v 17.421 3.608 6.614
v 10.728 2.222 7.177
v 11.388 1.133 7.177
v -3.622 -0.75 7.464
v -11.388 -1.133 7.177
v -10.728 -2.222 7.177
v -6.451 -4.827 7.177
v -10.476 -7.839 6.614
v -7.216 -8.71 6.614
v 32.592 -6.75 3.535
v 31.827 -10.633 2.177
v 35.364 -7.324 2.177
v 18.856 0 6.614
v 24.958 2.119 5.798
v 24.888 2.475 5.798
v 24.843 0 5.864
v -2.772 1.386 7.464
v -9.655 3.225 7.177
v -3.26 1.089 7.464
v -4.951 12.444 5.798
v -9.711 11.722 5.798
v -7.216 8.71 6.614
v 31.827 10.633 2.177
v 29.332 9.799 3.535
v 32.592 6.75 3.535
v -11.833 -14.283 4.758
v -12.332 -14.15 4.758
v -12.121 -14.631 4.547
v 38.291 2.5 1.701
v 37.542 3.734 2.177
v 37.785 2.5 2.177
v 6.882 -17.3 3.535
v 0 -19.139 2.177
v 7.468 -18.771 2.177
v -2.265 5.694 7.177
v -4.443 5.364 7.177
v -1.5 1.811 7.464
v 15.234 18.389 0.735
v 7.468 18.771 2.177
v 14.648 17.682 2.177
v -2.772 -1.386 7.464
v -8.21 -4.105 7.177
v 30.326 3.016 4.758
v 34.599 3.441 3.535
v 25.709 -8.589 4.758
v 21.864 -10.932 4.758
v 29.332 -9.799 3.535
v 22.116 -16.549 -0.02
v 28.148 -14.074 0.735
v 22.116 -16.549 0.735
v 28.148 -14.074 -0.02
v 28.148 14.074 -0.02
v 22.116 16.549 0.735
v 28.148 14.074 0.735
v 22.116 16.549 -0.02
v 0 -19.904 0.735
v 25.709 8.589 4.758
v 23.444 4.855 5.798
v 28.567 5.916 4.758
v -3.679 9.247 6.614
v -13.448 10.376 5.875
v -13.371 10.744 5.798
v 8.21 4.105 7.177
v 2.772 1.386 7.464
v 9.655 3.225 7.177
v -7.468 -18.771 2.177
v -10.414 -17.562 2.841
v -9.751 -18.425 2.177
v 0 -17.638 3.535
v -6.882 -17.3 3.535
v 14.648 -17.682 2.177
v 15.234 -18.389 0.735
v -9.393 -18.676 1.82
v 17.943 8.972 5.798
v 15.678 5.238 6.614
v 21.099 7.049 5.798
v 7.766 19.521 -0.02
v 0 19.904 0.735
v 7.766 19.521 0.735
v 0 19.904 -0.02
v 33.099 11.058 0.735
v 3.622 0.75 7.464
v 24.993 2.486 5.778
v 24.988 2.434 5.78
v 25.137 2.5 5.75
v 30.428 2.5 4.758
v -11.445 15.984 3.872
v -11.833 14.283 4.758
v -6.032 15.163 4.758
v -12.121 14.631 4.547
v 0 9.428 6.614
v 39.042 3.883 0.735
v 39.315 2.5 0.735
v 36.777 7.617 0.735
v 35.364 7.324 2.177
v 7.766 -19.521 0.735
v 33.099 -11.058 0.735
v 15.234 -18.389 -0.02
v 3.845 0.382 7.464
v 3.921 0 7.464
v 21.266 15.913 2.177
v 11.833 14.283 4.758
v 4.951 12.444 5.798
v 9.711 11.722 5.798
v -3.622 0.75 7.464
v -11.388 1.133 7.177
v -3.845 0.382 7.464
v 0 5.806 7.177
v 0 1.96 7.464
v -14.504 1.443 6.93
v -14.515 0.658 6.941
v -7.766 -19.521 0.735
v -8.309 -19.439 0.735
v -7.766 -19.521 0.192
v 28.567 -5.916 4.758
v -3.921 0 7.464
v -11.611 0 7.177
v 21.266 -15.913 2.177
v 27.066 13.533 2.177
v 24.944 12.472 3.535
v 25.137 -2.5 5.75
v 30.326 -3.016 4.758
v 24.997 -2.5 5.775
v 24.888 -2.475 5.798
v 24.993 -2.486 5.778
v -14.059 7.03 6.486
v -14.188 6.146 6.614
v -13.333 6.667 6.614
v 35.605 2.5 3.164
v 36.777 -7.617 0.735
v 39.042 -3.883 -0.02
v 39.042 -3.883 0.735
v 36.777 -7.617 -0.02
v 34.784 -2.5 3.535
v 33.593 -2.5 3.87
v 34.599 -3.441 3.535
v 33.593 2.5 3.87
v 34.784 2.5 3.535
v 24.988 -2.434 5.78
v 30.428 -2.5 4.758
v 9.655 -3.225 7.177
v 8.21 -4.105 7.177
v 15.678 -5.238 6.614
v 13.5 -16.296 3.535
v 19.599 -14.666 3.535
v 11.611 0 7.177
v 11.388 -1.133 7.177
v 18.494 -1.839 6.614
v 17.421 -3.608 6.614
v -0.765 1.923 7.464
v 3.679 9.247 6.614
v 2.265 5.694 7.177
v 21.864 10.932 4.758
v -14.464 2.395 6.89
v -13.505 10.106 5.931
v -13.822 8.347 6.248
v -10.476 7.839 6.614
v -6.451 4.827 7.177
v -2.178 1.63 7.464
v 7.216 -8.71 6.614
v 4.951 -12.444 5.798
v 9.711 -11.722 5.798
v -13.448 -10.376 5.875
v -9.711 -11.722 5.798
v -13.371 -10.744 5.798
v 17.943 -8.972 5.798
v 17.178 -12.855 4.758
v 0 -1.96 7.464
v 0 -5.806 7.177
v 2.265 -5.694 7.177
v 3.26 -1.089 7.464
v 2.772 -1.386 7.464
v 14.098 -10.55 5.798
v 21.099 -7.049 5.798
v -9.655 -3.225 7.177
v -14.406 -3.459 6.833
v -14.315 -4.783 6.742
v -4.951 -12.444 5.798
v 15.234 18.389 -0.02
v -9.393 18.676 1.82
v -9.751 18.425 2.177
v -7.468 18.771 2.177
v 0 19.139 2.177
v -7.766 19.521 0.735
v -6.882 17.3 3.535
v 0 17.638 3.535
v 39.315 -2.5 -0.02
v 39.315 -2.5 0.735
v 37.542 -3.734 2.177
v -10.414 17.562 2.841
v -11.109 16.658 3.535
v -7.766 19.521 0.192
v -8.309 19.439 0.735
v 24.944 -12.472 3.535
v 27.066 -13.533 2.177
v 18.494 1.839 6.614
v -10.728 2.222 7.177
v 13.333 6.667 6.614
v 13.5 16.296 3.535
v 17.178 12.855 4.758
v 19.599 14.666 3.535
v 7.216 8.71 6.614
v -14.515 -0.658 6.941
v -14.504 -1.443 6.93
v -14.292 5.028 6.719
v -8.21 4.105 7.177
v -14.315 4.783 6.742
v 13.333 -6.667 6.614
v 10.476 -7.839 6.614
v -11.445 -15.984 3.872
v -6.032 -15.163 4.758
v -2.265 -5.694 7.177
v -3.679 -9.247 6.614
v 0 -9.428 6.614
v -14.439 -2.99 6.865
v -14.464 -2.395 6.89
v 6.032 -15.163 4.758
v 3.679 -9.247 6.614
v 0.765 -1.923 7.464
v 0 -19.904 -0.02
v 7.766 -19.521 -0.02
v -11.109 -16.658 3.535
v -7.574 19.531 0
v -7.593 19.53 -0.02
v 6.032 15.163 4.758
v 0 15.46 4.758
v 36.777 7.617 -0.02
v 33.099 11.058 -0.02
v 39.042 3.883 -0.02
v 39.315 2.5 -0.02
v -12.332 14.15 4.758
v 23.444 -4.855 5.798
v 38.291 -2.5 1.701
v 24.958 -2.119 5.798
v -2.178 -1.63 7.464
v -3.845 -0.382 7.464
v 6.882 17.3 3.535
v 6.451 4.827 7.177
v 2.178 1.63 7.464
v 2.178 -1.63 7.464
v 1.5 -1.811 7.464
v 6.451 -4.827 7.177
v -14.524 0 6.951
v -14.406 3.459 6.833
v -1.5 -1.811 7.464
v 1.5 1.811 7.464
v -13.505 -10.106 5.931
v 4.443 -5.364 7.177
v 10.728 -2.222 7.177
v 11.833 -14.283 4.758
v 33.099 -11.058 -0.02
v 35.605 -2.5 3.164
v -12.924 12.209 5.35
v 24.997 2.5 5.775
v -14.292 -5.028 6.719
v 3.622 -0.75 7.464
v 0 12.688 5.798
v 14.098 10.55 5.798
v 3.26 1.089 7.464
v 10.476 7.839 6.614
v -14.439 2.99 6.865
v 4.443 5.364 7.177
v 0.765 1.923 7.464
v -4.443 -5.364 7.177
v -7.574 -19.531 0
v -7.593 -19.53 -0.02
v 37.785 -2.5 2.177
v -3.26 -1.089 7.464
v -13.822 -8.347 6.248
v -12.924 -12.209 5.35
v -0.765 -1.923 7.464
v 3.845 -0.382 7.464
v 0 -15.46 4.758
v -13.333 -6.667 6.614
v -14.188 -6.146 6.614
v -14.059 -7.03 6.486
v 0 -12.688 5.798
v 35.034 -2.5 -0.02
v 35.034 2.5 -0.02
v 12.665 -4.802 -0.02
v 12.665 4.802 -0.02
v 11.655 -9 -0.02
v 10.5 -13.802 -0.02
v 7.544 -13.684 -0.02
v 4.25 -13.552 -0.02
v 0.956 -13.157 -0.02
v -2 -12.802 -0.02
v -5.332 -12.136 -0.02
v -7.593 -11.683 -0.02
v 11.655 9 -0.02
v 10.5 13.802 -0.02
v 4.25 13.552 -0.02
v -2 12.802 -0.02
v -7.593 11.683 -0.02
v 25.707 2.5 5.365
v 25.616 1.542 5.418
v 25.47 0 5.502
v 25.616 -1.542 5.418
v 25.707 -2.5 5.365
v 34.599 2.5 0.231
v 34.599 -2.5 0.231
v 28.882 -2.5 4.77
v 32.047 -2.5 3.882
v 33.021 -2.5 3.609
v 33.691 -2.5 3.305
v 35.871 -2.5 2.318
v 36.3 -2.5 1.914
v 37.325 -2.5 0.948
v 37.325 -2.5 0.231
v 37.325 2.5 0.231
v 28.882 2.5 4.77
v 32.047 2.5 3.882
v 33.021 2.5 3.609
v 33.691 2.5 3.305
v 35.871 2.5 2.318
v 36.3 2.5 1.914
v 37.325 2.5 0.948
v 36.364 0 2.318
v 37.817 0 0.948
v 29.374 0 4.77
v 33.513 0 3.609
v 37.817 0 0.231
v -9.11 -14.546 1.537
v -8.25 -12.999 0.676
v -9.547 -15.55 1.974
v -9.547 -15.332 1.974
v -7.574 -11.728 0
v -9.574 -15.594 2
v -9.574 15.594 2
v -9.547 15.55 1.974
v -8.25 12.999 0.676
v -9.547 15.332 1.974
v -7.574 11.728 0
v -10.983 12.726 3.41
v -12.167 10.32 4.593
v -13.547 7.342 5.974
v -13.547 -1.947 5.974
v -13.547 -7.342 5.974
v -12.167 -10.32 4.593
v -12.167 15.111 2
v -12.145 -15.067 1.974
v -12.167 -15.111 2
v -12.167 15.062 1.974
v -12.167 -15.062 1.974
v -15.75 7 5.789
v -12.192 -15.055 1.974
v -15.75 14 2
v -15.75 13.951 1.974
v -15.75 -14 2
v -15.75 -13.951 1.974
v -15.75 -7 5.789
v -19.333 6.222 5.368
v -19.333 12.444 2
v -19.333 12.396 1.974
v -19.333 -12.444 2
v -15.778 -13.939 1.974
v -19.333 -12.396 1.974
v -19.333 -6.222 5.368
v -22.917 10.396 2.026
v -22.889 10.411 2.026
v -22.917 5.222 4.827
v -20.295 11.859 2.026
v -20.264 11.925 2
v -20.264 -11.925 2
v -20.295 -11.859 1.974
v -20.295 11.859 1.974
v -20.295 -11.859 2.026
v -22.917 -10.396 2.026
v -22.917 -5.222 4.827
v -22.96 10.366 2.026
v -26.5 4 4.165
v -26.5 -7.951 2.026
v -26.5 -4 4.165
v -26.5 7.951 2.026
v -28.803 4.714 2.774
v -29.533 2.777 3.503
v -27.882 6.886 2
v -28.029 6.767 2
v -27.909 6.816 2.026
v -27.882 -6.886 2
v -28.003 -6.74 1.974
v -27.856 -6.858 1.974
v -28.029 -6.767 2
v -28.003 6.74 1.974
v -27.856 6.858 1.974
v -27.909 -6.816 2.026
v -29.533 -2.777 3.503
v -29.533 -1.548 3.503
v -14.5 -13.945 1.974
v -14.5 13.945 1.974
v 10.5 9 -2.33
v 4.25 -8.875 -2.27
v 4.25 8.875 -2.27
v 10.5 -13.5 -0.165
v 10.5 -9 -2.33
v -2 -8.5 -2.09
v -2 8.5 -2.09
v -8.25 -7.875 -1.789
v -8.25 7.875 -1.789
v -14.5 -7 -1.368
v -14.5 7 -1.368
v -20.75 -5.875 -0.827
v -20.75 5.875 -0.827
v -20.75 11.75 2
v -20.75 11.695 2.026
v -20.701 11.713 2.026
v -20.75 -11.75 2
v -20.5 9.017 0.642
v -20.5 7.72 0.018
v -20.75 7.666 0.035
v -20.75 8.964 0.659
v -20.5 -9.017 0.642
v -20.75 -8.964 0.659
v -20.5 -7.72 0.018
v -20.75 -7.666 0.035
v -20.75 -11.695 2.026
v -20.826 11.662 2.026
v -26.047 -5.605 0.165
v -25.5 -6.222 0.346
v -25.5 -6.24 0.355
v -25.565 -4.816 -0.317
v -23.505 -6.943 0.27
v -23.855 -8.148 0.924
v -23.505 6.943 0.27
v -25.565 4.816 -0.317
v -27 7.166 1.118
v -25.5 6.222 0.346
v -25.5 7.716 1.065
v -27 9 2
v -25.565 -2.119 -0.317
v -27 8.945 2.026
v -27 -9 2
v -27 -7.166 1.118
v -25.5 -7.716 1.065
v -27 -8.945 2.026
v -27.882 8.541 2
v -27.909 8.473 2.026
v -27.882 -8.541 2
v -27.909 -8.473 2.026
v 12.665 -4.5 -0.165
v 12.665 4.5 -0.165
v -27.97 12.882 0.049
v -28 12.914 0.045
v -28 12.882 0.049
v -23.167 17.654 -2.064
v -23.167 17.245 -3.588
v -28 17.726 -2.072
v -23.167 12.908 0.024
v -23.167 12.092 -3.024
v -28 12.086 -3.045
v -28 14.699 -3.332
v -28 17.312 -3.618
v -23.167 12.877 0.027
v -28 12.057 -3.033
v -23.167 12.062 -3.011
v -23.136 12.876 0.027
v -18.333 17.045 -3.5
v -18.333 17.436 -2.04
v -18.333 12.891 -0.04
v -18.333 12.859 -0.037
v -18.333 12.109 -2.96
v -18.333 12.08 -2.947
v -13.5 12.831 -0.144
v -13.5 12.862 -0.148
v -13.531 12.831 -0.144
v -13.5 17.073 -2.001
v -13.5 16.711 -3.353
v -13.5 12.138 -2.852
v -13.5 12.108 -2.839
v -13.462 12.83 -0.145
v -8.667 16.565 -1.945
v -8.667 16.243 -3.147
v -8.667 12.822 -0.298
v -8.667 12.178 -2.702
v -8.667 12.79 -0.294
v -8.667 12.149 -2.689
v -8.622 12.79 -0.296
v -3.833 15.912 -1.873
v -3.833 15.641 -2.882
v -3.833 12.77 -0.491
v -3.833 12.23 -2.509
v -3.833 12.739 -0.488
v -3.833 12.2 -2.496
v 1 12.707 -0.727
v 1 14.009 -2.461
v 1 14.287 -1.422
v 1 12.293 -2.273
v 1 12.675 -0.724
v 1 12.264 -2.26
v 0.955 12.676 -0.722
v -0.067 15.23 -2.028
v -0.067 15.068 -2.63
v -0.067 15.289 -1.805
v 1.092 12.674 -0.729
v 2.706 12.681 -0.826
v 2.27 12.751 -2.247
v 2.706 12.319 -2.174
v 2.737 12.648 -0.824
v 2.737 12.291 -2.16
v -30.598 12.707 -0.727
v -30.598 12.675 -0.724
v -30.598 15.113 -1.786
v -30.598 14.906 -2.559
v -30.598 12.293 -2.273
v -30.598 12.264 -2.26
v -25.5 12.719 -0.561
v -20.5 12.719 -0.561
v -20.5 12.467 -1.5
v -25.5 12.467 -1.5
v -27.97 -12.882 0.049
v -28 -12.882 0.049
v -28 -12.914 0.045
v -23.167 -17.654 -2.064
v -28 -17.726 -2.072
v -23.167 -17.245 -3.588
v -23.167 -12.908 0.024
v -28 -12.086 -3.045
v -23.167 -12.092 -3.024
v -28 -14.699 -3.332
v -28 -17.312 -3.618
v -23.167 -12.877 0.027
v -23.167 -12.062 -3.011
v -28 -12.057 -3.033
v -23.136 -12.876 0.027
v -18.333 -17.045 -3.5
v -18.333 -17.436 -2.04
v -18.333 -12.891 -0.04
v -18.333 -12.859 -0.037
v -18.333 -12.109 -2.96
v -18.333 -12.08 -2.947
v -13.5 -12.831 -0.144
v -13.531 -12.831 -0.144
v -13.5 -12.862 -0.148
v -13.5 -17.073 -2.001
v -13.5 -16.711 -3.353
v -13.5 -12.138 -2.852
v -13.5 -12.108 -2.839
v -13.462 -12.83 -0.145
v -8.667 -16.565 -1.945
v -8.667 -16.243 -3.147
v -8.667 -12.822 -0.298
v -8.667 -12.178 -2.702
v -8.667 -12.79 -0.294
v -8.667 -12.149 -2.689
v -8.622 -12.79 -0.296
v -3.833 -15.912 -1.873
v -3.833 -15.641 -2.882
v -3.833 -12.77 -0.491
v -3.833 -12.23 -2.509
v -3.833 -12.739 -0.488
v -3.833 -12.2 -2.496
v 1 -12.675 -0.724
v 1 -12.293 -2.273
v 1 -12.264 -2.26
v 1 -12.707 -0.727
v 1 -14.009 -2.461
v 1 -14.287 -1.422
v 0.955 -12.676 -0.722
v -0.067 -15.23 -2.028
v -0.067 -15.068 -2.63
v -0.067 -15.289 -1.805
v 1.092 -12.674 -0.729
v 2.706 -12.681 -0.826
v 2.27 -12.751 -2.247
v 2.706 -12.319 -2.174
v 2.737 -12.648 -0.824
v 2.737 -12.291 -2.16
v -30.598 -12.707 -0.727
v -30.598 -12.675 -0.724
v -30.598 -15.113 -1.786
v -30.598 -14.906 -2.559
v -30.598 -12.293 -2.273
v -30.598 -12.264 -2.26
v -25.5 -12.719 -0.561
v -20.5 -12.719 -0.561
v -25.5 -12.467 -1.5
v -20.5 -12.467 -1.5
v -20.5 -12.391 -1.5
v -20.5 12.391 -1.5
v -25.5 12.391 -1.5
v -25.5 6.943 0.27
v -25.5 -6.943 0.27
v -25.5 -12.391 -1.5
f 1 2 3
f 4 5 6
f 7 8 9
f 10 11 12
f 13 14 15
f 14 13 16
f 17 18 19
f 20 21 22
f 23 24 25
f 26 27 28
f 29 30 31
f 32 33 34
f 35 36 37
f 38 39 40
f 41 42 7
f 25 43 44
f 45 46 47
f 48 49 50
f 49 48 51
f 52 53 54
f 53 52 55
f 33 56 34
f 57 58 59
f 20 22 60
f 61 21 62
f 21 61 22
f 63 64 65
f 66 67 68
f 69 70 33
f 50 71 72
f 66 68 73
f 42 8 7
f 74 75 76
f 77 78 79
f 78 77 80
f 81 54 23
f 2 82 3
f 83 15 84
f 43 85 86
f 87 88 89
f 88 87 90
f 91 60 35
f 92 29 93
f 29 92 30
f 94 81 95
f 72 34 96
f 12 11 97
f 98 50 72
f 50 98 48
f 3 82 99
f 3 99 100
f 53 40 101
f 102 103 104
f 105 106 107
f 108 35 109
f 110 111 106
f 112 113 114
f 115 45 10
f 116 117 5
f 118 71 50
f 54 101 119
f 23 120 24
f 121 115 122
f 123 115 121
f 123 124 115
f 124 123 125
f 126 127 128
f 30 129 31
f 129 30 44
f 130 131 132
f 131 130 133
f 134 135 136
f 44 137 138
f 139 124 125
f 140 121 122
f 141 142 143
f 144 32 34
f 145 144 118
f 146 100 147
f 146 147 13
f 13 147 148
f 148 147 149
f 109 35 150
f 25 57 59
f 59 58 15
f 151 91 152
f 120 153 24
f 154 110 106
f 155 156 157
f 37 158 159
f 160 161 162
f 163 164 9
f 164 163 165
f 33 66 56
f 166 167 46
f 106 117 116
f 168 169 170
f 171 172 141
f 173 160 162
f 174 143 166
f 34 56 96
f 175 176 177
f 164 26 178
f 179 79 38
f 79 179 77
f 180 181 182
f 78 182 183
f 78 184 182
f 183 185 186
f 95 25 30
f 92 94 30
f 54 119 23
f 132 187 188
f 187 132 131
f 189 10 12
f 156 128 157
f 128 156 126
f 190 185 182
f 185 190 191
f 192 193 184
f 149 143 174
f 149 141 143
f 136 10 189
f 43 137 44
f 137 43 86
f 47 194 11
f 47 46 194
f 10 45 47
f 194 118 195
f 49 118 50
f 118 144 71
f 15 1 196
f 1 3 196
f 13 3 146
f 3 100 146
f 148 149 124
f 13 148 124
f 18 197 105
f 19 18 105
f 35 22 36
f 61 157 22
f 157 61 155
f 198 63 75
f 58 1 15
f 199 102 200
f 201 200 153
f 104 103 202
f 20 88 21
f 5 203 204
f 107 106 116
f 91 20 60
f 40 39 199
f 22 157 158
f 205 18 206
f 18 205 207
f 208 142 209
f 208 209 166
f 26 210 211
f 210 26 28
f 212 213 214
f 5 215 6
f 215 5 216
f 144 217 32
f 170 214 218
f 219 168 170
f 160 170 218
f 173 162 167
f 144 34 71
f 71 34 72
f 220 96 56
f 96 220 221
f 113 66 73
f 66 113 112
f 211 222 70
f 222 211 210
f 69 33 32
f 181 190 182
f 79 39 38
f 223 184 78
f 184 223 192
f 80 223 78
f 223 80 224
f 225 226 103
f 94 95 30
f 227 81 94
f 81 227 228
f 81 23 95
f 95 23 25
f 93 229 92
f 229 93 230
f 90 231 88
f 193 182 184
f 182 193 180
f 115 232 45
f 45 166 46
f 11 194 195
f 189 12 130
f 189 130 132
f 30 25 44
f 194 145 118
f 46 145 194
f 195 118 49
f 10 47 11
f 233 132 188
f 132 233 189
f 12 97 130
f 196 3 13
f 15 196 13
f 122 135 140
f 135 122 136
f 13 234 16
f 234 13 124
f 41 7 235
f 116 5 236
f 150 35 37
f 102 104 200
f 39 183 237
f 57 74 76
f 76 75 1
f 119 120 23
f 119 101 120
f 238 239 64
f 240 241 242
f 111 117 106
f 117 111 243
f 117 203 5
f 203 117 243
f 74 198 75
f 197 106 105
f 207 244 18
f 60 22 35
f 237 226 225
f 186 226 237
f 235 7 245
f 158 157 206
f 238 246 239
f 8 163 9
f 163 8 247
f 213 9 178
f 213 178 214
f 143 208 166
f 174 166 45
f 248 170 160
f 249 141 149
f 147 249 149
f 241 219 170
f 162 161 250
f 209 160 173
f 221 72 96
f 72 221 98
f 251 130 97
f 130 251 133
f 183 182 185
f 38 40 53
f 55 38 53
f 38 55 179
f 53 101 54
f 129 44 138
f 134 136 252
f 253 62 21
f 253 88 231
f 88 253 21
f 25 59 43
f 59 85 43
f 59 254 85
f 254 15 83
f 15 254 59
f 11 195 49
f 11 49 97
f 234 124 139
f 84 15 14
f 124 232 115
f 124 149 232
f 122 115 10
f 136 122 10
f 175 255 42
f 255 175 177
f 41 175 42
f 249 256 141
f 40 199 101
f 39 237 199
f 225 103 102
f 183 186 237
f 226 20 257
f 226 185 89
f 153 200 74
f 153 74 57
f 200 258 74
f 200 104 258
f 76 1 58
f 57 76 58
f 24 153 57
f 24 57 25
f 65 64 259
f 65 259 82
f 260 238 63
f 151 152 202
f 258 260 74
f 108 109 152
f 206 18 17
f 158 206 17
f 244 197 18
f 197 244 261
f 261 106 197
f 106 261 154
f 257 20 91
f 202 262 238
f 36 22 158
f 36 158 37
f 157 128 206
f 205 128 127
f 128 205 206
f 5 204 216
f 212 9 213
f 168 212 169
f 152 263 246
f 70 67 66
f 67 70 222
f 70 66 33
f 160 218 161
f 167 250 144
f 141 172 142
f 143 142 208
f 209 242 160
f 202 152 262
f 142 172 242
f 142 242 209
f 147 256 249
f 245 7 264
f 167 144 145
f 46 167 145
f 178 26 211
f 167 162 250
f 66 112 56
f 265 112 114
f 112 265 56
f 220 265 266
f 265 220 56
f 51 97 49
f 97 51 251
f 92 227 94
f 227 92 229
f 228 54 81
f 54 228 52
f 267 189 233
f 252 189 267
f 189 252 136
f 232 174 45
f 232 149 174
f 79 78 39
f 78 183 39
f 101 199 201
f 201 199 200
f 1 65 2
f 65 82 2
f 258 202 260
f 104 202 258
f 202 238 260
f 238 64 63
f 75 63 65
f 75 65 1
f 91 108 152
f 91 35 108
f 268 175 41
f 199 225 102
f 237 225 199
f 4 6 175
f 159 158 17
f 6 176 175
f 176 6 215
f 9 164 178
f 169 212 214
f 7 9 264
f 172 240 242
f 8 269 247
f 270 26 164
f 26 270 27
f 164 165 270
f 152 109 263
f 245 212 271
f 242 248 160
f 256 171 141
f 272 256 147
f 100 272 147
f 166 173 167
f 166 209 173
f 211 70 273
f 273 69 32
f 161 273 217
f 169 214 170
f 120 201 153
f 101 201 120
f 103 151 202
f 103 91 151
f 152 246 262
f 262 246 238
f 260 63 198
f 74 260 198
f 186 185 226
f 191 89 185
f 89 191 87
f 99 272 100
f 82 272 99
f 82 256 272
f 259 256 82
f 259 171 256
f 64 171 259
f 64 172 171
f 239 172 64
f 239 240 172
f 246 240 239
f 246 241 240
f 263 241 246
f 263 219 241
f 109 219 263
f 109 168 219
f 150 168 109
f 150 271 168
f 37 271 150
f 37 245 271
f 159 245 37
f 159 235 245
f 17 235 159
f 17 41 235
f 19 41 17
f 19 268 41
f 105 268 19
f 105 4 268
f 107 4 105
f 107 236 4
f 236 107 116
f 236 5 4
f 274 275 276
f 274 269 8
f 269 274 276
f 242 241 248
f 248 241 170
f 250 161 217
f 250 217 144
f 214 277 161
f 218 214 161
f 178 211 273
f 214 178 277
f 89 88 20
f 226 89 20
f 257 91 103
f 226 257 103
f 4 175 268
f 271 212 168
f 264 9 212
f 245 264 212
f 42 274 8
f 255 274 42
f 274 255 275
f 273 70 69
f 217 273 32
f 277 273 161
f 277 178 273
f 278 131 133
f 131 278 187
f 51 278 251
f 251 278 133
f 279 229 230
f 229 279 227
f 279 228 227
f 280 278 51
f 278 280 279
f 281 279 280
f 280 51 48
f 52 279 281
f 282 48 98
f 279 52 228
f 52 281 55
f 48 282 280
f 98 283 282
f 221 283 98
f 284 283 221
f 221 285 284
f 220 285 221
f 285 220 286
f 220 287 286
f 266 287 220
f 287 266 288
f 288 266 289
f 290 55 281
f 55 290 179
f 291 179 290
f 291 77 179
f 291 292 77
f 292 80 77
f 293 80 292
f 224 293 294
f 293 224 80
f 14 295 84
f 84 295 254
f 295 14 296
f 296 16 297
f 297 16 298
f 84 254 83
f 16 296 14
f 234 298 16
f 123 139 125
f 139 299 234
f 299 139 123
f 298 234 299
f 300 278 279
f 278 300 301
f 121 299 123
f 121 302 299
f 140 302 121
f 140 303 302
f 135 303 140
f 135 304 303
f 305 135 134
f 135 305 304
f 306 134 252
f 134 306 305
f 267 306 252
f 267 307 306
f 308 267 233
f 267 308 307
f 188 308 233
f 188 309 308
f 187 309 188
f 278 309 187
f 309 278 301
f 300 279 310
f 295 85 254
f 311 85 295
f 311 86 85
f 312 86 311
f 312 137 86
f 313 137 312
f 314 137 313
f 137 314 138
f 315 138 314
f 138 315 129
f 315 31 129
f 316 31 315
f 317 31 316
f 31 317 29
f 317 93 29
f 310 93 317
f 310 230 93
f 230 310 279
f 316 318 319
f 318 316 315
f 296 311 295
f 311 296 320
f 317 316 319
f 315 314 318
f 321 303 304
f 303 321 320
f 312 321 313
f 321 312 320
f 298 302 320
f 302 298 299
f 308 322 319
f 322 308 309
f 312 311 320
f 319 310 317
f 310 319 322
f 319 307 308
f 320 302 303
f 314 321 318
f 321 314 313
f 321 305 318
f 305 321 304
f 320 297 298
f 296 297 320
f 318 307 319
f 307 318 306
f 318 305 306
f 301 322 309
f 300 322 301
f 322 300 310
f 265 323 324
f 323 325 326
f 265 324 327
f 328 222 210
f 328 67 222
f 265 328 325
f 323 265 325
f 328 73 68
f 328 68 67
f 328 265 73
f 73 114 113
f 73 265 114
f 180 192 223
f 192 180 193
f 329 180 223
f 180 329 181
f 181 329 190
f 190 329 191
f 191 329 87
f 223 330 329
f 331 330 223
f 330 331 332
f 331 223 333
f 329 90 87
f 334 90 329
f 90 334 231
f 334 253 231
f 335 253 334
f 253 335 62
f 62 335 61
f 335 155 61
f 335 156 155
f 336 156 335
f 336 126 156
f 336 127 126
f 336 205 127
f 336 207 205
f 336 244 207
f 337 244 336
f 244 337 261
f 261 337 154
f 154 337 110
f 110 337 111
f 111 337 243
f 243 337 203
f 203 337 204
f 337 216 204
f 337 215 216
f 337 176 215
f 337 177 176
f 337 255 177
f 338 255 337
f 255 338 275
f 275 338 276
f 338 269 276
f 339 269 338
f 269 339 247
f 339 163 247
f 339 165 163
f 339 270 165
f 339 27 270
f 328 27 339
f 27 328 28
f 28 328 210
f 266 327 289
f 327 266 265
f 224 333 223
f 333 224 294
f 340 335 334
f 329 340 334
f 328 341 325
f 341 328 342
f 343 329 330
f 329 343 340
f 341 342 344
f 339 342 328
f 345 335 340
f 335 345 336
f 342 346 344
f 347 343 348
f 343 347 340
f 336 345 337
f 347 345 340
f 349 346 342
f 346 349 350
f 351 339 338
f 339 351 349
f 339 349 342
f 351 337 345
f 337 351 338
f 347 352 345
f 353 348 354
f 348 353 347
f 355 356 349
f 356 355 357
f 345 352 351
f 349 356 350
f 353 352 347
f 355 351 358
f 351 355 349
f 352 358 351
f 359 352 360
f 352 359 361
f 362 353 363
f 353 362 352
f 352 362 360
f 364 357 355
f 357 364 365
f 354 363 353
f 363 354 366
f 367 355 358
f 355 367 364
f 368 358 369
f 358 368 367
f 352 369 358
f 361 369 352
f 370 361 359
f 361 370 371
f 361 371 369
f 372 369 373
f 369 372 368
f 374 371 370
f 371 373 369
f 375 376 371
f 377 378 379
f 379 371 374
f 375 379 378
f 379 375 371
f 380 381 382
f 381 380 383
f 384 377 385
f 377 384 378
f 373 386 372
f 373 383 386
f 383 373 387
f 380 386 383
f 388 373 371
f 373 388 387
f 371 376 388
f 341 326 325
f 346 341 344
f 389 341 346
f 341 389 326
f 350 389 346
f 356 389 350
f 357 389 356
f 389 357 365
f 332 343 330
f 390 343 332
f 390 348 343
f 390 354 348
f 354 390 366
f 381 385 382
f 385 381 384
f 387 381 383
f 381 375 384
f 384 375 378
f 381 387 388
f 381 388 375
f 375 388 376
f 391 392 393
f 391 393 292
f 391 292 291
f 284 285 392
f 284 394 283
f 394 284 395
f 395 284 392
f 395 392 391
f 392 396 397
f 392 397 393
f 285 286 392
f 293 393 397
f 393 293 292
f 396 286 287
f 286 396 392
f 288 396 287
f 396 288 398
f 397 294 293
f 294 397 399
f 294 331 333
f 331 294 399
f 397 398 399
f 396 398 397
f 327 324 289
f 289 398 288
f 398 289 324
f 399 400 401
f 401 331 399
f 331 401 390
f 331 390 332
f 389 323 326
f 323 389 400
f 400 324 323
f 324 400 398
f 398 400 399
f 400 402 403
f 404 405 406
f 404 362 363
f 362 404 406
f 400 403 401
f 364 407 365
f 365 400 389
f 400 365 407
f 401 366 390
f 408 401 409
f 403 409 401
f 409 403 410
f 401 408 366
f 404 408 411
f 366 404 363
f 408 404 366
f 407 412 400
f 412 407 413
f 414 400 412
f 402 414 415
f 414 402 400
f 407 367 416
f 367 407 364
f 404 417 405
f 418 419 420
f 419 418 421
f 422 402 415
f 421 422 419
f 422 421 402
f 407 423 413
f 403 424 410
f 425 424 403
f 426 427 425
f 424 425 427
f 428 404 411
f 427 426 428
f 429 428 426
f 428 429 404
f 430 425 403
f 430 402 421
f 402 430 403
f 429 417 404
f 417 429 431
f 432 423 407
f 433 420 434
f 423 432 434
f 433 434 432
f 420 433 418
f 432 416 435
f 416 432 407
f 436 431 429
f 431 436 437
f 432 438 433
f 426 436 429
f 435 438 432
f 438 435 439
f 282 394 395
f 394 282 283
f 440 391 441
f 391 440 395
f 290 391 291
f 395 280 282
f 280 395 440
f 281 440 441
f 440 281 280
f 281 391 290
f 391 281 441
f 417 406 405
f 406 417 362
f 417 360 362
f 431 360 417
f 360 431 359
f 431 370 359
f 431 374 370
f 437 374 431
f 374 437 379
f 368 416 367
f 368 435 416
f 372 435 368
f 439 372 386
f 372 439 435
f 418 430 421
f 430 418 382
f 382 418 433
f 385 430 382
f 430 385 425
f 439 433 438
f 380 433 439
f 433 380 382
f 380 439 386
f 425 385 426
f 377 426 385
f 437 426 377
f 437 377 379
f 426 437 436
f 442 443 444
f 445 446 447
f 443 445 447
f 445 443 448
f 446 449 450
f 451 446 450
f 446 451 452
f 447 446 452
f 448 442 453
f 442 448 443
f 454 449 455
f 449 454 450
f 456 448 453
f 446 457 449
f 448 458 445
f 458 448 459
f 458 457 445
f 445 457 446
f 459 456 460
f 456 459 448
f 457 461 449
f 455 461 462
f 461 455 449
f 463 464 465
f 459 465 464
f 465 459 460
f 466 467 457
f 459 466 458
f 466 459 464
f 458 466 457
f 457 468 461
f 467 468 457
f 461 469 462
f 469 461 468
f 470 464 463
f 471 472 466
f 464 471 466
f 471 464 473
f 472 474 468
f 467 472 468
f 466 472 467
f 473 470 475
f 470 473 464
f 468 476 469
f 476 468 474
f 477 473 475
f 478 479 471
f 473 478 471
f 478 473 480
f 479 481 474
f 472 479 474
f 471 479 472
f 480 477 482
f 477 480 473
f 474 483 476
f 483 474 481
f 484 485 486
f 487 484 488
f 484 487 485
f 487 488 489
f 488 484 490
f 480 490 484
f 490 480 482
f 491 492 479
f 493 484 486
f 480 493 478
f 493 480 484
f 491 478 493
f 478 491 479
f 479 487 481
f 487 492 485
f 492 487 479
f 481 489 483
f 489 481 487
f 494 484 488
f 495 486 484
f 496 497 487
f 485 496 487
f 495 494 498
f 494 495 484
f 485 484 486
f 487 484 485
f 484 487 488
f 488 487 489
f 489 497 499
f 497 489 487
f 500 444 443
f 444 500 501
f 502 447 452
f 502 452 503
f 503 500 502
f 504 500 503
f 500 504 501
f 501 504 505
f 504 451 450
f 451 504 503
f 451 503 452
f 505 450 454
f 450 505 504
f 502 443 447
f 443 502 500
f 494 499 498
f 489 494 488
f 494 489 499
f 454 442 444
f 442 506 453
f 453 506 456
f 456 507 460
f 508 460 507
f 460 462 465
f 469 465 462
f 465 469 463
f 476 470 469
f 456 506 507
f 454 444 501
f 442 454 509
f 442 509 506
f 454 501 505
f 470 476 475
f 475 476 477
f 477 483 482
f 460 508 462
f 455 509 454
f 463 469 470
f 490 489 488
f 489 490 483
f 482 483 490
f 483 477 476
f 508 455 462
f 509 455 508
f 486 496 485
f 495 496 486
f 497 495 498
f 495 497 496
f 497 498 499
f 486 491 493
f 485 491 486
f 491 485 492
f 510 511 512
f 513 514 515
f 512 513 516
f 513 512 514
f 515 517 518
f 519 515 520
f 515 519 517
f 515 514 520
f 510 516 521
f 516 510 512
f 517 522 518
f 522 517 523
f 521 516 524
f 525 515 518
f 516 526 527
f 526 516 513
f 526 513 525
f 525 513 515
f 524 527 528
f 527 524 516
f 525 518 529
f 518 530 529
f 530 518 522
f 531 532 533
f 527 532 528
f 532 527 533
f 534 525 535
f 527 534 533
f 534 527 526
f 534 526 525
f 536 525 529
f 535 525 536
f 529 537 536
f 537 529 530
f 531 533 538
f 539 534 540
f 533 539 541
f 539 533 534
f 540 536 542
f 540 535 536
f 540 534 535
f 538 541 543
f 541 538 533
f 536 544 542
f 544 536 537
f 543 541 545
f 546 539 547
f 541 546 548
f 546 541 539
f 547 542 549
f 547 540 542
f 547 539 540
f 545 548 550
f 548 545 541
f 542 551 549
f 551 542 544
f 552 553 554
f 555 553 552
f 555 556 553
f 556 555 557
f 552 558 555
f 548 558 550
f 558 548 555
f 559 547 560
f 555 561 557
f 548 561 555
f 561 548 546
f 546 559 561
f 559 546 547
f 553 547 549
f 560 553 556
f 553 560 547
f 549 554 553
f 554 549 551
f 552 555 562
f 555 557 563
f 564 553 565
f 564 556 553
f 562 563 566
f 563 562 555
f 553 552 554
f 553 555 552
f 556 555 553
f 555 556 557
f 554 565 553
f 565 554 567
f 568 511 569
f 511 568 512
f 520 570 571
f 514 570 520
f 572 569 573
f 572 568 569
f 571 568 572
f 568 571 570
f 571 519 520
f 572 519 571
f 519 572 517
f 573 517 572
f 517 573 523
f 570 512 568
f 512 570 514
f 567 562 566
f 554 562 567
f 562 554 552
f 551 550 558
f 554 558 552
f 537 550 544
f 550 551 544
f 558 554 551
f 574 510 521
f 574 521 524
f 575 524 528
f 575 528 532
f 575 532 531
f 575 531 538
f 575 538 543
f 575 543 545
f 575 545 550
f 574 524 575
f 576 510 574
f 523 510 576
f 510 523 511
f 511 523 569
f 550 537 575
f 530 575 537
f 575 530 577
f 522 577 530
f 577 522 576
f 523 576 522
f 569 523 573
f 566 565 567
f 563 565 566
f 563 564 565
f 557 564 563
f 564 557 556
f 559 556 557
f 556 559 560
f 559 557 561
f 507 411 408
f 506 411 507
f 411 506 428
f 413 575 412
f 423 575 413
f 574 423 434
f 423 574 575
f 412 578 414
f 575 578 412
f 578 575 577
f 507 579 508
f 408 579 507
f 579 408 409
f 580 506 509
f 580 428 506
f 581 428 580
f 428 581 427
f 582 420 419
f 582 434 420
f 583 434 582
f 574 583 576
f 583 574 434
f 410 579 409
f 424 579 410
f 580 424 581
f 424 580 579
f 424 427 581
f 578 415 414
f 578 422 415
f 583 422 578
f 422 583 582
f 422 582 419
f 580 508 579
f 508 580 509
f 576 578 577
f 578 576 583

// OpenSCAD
// file: util.scad
fn1 = 32;
fn2 = 16;

module util_half_sphere(radius, fn=fn1) {
    difference() {
        sphere(radius, $fn=fn);
        translate([0,0,-(radius+radius/19)])
            cube(2*radius+radius/10, center=true);
    }
}

function gcd(a,b) = a == b ? a : a > b ? gcd(a-b, b) : gcd(a, b-a);

module util_saucer(length, width, height, fn=fn1) {
    rad = gcd(length,gcd(width,height));
    //rad = 10;
    scale([length/(2*rad), width/(2*rad), height/rad])
        util_half_sphere(rad, fn);
}

module util_half_cylinder(length, radius, inner_fn=fn2, outer_fn=fn1) {
    maxval = max(length, 2*radius);
    intersection() {
        difference() {
            rotate([0,90,0])
                translate([0,0,-(length/2 + length/20)])
                    cylinder(length+length/10, radius, radius, $fn=inner_fn);
            
            translate([0,0,(maxval/2 + maxval/19)])
                cube(maxval+maxval/10, center=true);
        }
        
        translate([0,0,-(radius+radius/20)])
            cylinder(radius + radius/10, length/2, length/2, $fn=outer_fn);
    }
}

module util_body(length, width, height, upper_height, fn=fn1) {
    rad = gcd(length, gcd(width, upper_height));
    
    scale(.995) scale([length/(2*rad), width/(2*rad), 1])
        util_half_cylinder(2*rad, height, outer_fn=fn);
}

module util_graded_cylinder(height, radius_start, radius_end, grades=1, fn=fn1) {
    height_grade = height / grades;
    radius_grade = (radius_start - radius_end) / (grades * grades);
    for (i = [0 : 1 : grades]) {
        translate([0,0,i*height_grade])
            cylinder(height_grade, 
                     radius_start - i*radius_grade * i,
                     radius_start - (i+1) * radius_grade * (i+1),
                     $fn = fn);
    }
}

module util_nacelle(length, width, height, curved=false, up=true, front_bulge=false) {
    rad = min(width, height/2);
    grads = curved ? 6 : 1;
    scale_factor = front_bulge ? 1.1 : 1;
    direction = up ? -1 : 1;
    difference() {
        scale([1, width/ (2*rad), height/rad])
            difference() {
                union() {
                    rotate([0,-90,0])
                        rotate(30)
                            util_graded_cylinder(length-rad, rad, rad/2, grads, 6);
                    scale(scale_factor) 
                        rotate([0,90,0]) rotate(90) sphere(rad, $fn=6);
                }
                
                translate([-length/2, 0, direction * (height/2 + height/19)])
                    cube([length+length, width+width, height+height/10], center=true);
            }
        
        translate([-length-(curved?length/3:0), 0, -length/3])
            rotate([0,-45,0])
                cube(length, center=true);
    }
}

module util_mirrored(v) {
    children();
    mirror(v) children();
}

module util_ring(outer, inner, height) {
    difference() {
        translate([0,0,-height/2])
            cylinder(height, outer, outer);
        translate([0,0,-(height/2 + height/19)])
            cylinder(height+height/10, inner, inner);
    }
}

module util_star(radius, thick, num, half=false) {
    angle = 360/num;
    offset = half? angle/2 : 0;
    for (i = [0: 1: num]) {
        rotate(i* angle + offset)
            translate([radius/2,0,0])
                cube([radius, thick, thick], center=true);
    }
}

module util_ring_star(radius, thick, num, inner, half=false) {
    outer=inner+thick;
    avg = (inner + outer)/2;
    union() {
        difference() {
            util_star(radius, thick, num, half);
            cylinder(2*thick, outer, outer, $fn=num, center=true);
        }
        util_ring(outer, inner, thick);
    }
}

module util_hangar_disk(height, lower, upper, num, fn=fn1) {
    difference() {
            cylinder(height, lower, upper, $fn=fn, center=true);
        difference() {
            scale([1,1,22])
                util_star(1.1*upper, height/20, num, half=true);
            scale(.95)
                cylinder(height, lower, upper, $fn=fn, center=true);
        }
    }
}

module util_hangar_form(length, width, height, num, inner=0) {
    l = 0.6* max(length, width);
    h = 2.5* height;
    thick = min(height/20,1);
    inner = inner == 0 ? l/3 : inner;
    difference() {
        children();
        scale([1,1,h/thick]) 
            util_ring_star(l, thick, num, inner, half=true);
    }
    scale(.95) children();
}

module util_nacelle_bar(span, height, width, thickness) {
    rad = (span*span/(8*height) + height/2);
    outer = rad + thickness/2;
    inner = rad - thickness/2;
    difference(){
        translate([0,0,outer])
            rotate([0,90,0])
                util_ring(outer, inner, width);
    
        translate([0,0,1.1*outer+height])
            cube(2.2*outer, center=true);
    }
}
// main file
use <util.scad>;

module scout_dish() {
    difference() {
        union() {
            difference() {
                util_saucer(80,40,7.5);
                translate([40,0,0])
                    rotate([0,-60,0])
                        cube([5,5,60],center=true);
            }
            translate([0,0,.25]) scale(.95) util_saucer(80,40,7.5);
        }
        
        translate([-50,0,0])
            rotate([0,-45,0])
                cube([60,60,60], center=true);
        
//        util_mirrored([0,1,0])
//            translate([0,20,-1])
//                rotate([-45,0,0])
//                    cube([80,10,10],center=true);   
        
        
    }
    
    
}

module scout_nacelle_assembly() {
    util_mirrored([0,1,0])
        translate([-28,12.5,-1.5])
            rotate([75,0,0])
                mirror([1,0,0])
                    util_nacelle(32,3.2,6,curved=true,up=false);
    
           
    translate([-23,0,2])
        mirror([0,0,1])
            util_nacelle_bar(30,3.5,5,1);
}

module scout_body() {
    translate([-5,0,2])
        util_nacelle(24,32,5,curved=true,up=true);
        
    translate([10.5,0,2])
        util_nacelle(40,36,5,curved=true,up=false);
}

module scout_main() {
    scout_dish();
    scout_body();
    scout_nacelle_assembly();
}

module scout() {
    scale(1) scout_main();
}

module scout_msd() {
    projection(cut=true)
    rotate([-90,0,0])
    union() {
        scout_dish();
        scout_body();
        translate([-30,0,5]) util_nacelle(48,9,7.5, curved=true);
    }
}

scout();

//scout_msd();
